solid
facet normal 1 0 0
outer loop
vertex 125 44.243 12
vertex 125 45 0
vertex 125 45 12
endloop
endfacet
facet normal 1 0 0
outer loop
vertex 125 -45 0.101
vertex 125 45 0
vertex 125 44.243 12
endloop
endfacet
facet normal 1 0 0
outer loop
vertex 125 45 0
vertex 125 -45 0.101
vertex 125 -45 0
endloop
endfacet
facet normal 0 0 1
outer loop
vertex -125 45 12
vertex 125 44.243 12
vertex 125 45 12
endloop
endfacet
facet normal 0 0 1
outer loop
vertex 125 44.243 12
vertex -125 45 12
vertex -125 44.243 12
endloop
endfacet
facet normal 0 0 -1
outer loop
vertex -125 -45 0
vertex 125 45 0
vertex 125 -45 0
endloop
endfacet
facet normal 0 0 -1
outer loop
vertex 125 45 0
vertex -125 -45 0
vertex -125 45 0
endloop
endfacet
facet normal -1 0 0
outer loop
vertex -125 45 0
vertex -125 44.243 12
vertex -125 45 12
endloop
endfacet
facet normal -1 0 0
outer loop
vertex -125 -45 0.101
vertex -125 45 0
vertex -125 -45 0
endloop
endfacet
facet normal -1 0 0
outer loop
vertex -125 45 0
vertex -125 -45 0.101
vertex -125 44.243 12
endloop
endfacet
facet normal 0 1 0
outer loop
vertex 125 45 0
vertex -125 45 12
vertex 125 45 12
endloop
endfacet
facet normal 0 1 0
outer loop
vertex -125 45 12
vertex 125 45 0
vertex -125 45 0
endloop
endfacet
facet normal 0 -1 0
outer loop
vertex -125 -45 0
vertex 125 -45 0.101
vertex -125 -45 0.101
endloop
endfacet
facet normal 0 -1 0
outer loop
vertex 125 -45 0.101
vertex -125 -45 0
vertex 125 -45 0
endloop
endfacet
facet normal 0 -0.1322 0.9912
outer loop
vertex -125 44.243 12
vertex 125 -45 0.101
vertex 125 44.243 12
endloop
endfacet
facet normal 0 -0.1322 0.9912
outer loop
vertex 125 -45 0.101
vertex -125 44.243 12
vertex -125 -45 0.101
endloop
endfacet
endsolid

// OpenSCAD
x=250;
//big kitchen
y=160;
z=25;
//living room
y=90;
z=12;

d=20;
filament=1.8*2;

pad=0.1;

translate([-x/2,-y/2,0])
difference(){
    cube([x,y,z]);
    rotate([atan(z/y),0,0])
    translate([-x/2,0,pad])
    cube([x*2,y*2,z*2]);
}

circle(d=280);
